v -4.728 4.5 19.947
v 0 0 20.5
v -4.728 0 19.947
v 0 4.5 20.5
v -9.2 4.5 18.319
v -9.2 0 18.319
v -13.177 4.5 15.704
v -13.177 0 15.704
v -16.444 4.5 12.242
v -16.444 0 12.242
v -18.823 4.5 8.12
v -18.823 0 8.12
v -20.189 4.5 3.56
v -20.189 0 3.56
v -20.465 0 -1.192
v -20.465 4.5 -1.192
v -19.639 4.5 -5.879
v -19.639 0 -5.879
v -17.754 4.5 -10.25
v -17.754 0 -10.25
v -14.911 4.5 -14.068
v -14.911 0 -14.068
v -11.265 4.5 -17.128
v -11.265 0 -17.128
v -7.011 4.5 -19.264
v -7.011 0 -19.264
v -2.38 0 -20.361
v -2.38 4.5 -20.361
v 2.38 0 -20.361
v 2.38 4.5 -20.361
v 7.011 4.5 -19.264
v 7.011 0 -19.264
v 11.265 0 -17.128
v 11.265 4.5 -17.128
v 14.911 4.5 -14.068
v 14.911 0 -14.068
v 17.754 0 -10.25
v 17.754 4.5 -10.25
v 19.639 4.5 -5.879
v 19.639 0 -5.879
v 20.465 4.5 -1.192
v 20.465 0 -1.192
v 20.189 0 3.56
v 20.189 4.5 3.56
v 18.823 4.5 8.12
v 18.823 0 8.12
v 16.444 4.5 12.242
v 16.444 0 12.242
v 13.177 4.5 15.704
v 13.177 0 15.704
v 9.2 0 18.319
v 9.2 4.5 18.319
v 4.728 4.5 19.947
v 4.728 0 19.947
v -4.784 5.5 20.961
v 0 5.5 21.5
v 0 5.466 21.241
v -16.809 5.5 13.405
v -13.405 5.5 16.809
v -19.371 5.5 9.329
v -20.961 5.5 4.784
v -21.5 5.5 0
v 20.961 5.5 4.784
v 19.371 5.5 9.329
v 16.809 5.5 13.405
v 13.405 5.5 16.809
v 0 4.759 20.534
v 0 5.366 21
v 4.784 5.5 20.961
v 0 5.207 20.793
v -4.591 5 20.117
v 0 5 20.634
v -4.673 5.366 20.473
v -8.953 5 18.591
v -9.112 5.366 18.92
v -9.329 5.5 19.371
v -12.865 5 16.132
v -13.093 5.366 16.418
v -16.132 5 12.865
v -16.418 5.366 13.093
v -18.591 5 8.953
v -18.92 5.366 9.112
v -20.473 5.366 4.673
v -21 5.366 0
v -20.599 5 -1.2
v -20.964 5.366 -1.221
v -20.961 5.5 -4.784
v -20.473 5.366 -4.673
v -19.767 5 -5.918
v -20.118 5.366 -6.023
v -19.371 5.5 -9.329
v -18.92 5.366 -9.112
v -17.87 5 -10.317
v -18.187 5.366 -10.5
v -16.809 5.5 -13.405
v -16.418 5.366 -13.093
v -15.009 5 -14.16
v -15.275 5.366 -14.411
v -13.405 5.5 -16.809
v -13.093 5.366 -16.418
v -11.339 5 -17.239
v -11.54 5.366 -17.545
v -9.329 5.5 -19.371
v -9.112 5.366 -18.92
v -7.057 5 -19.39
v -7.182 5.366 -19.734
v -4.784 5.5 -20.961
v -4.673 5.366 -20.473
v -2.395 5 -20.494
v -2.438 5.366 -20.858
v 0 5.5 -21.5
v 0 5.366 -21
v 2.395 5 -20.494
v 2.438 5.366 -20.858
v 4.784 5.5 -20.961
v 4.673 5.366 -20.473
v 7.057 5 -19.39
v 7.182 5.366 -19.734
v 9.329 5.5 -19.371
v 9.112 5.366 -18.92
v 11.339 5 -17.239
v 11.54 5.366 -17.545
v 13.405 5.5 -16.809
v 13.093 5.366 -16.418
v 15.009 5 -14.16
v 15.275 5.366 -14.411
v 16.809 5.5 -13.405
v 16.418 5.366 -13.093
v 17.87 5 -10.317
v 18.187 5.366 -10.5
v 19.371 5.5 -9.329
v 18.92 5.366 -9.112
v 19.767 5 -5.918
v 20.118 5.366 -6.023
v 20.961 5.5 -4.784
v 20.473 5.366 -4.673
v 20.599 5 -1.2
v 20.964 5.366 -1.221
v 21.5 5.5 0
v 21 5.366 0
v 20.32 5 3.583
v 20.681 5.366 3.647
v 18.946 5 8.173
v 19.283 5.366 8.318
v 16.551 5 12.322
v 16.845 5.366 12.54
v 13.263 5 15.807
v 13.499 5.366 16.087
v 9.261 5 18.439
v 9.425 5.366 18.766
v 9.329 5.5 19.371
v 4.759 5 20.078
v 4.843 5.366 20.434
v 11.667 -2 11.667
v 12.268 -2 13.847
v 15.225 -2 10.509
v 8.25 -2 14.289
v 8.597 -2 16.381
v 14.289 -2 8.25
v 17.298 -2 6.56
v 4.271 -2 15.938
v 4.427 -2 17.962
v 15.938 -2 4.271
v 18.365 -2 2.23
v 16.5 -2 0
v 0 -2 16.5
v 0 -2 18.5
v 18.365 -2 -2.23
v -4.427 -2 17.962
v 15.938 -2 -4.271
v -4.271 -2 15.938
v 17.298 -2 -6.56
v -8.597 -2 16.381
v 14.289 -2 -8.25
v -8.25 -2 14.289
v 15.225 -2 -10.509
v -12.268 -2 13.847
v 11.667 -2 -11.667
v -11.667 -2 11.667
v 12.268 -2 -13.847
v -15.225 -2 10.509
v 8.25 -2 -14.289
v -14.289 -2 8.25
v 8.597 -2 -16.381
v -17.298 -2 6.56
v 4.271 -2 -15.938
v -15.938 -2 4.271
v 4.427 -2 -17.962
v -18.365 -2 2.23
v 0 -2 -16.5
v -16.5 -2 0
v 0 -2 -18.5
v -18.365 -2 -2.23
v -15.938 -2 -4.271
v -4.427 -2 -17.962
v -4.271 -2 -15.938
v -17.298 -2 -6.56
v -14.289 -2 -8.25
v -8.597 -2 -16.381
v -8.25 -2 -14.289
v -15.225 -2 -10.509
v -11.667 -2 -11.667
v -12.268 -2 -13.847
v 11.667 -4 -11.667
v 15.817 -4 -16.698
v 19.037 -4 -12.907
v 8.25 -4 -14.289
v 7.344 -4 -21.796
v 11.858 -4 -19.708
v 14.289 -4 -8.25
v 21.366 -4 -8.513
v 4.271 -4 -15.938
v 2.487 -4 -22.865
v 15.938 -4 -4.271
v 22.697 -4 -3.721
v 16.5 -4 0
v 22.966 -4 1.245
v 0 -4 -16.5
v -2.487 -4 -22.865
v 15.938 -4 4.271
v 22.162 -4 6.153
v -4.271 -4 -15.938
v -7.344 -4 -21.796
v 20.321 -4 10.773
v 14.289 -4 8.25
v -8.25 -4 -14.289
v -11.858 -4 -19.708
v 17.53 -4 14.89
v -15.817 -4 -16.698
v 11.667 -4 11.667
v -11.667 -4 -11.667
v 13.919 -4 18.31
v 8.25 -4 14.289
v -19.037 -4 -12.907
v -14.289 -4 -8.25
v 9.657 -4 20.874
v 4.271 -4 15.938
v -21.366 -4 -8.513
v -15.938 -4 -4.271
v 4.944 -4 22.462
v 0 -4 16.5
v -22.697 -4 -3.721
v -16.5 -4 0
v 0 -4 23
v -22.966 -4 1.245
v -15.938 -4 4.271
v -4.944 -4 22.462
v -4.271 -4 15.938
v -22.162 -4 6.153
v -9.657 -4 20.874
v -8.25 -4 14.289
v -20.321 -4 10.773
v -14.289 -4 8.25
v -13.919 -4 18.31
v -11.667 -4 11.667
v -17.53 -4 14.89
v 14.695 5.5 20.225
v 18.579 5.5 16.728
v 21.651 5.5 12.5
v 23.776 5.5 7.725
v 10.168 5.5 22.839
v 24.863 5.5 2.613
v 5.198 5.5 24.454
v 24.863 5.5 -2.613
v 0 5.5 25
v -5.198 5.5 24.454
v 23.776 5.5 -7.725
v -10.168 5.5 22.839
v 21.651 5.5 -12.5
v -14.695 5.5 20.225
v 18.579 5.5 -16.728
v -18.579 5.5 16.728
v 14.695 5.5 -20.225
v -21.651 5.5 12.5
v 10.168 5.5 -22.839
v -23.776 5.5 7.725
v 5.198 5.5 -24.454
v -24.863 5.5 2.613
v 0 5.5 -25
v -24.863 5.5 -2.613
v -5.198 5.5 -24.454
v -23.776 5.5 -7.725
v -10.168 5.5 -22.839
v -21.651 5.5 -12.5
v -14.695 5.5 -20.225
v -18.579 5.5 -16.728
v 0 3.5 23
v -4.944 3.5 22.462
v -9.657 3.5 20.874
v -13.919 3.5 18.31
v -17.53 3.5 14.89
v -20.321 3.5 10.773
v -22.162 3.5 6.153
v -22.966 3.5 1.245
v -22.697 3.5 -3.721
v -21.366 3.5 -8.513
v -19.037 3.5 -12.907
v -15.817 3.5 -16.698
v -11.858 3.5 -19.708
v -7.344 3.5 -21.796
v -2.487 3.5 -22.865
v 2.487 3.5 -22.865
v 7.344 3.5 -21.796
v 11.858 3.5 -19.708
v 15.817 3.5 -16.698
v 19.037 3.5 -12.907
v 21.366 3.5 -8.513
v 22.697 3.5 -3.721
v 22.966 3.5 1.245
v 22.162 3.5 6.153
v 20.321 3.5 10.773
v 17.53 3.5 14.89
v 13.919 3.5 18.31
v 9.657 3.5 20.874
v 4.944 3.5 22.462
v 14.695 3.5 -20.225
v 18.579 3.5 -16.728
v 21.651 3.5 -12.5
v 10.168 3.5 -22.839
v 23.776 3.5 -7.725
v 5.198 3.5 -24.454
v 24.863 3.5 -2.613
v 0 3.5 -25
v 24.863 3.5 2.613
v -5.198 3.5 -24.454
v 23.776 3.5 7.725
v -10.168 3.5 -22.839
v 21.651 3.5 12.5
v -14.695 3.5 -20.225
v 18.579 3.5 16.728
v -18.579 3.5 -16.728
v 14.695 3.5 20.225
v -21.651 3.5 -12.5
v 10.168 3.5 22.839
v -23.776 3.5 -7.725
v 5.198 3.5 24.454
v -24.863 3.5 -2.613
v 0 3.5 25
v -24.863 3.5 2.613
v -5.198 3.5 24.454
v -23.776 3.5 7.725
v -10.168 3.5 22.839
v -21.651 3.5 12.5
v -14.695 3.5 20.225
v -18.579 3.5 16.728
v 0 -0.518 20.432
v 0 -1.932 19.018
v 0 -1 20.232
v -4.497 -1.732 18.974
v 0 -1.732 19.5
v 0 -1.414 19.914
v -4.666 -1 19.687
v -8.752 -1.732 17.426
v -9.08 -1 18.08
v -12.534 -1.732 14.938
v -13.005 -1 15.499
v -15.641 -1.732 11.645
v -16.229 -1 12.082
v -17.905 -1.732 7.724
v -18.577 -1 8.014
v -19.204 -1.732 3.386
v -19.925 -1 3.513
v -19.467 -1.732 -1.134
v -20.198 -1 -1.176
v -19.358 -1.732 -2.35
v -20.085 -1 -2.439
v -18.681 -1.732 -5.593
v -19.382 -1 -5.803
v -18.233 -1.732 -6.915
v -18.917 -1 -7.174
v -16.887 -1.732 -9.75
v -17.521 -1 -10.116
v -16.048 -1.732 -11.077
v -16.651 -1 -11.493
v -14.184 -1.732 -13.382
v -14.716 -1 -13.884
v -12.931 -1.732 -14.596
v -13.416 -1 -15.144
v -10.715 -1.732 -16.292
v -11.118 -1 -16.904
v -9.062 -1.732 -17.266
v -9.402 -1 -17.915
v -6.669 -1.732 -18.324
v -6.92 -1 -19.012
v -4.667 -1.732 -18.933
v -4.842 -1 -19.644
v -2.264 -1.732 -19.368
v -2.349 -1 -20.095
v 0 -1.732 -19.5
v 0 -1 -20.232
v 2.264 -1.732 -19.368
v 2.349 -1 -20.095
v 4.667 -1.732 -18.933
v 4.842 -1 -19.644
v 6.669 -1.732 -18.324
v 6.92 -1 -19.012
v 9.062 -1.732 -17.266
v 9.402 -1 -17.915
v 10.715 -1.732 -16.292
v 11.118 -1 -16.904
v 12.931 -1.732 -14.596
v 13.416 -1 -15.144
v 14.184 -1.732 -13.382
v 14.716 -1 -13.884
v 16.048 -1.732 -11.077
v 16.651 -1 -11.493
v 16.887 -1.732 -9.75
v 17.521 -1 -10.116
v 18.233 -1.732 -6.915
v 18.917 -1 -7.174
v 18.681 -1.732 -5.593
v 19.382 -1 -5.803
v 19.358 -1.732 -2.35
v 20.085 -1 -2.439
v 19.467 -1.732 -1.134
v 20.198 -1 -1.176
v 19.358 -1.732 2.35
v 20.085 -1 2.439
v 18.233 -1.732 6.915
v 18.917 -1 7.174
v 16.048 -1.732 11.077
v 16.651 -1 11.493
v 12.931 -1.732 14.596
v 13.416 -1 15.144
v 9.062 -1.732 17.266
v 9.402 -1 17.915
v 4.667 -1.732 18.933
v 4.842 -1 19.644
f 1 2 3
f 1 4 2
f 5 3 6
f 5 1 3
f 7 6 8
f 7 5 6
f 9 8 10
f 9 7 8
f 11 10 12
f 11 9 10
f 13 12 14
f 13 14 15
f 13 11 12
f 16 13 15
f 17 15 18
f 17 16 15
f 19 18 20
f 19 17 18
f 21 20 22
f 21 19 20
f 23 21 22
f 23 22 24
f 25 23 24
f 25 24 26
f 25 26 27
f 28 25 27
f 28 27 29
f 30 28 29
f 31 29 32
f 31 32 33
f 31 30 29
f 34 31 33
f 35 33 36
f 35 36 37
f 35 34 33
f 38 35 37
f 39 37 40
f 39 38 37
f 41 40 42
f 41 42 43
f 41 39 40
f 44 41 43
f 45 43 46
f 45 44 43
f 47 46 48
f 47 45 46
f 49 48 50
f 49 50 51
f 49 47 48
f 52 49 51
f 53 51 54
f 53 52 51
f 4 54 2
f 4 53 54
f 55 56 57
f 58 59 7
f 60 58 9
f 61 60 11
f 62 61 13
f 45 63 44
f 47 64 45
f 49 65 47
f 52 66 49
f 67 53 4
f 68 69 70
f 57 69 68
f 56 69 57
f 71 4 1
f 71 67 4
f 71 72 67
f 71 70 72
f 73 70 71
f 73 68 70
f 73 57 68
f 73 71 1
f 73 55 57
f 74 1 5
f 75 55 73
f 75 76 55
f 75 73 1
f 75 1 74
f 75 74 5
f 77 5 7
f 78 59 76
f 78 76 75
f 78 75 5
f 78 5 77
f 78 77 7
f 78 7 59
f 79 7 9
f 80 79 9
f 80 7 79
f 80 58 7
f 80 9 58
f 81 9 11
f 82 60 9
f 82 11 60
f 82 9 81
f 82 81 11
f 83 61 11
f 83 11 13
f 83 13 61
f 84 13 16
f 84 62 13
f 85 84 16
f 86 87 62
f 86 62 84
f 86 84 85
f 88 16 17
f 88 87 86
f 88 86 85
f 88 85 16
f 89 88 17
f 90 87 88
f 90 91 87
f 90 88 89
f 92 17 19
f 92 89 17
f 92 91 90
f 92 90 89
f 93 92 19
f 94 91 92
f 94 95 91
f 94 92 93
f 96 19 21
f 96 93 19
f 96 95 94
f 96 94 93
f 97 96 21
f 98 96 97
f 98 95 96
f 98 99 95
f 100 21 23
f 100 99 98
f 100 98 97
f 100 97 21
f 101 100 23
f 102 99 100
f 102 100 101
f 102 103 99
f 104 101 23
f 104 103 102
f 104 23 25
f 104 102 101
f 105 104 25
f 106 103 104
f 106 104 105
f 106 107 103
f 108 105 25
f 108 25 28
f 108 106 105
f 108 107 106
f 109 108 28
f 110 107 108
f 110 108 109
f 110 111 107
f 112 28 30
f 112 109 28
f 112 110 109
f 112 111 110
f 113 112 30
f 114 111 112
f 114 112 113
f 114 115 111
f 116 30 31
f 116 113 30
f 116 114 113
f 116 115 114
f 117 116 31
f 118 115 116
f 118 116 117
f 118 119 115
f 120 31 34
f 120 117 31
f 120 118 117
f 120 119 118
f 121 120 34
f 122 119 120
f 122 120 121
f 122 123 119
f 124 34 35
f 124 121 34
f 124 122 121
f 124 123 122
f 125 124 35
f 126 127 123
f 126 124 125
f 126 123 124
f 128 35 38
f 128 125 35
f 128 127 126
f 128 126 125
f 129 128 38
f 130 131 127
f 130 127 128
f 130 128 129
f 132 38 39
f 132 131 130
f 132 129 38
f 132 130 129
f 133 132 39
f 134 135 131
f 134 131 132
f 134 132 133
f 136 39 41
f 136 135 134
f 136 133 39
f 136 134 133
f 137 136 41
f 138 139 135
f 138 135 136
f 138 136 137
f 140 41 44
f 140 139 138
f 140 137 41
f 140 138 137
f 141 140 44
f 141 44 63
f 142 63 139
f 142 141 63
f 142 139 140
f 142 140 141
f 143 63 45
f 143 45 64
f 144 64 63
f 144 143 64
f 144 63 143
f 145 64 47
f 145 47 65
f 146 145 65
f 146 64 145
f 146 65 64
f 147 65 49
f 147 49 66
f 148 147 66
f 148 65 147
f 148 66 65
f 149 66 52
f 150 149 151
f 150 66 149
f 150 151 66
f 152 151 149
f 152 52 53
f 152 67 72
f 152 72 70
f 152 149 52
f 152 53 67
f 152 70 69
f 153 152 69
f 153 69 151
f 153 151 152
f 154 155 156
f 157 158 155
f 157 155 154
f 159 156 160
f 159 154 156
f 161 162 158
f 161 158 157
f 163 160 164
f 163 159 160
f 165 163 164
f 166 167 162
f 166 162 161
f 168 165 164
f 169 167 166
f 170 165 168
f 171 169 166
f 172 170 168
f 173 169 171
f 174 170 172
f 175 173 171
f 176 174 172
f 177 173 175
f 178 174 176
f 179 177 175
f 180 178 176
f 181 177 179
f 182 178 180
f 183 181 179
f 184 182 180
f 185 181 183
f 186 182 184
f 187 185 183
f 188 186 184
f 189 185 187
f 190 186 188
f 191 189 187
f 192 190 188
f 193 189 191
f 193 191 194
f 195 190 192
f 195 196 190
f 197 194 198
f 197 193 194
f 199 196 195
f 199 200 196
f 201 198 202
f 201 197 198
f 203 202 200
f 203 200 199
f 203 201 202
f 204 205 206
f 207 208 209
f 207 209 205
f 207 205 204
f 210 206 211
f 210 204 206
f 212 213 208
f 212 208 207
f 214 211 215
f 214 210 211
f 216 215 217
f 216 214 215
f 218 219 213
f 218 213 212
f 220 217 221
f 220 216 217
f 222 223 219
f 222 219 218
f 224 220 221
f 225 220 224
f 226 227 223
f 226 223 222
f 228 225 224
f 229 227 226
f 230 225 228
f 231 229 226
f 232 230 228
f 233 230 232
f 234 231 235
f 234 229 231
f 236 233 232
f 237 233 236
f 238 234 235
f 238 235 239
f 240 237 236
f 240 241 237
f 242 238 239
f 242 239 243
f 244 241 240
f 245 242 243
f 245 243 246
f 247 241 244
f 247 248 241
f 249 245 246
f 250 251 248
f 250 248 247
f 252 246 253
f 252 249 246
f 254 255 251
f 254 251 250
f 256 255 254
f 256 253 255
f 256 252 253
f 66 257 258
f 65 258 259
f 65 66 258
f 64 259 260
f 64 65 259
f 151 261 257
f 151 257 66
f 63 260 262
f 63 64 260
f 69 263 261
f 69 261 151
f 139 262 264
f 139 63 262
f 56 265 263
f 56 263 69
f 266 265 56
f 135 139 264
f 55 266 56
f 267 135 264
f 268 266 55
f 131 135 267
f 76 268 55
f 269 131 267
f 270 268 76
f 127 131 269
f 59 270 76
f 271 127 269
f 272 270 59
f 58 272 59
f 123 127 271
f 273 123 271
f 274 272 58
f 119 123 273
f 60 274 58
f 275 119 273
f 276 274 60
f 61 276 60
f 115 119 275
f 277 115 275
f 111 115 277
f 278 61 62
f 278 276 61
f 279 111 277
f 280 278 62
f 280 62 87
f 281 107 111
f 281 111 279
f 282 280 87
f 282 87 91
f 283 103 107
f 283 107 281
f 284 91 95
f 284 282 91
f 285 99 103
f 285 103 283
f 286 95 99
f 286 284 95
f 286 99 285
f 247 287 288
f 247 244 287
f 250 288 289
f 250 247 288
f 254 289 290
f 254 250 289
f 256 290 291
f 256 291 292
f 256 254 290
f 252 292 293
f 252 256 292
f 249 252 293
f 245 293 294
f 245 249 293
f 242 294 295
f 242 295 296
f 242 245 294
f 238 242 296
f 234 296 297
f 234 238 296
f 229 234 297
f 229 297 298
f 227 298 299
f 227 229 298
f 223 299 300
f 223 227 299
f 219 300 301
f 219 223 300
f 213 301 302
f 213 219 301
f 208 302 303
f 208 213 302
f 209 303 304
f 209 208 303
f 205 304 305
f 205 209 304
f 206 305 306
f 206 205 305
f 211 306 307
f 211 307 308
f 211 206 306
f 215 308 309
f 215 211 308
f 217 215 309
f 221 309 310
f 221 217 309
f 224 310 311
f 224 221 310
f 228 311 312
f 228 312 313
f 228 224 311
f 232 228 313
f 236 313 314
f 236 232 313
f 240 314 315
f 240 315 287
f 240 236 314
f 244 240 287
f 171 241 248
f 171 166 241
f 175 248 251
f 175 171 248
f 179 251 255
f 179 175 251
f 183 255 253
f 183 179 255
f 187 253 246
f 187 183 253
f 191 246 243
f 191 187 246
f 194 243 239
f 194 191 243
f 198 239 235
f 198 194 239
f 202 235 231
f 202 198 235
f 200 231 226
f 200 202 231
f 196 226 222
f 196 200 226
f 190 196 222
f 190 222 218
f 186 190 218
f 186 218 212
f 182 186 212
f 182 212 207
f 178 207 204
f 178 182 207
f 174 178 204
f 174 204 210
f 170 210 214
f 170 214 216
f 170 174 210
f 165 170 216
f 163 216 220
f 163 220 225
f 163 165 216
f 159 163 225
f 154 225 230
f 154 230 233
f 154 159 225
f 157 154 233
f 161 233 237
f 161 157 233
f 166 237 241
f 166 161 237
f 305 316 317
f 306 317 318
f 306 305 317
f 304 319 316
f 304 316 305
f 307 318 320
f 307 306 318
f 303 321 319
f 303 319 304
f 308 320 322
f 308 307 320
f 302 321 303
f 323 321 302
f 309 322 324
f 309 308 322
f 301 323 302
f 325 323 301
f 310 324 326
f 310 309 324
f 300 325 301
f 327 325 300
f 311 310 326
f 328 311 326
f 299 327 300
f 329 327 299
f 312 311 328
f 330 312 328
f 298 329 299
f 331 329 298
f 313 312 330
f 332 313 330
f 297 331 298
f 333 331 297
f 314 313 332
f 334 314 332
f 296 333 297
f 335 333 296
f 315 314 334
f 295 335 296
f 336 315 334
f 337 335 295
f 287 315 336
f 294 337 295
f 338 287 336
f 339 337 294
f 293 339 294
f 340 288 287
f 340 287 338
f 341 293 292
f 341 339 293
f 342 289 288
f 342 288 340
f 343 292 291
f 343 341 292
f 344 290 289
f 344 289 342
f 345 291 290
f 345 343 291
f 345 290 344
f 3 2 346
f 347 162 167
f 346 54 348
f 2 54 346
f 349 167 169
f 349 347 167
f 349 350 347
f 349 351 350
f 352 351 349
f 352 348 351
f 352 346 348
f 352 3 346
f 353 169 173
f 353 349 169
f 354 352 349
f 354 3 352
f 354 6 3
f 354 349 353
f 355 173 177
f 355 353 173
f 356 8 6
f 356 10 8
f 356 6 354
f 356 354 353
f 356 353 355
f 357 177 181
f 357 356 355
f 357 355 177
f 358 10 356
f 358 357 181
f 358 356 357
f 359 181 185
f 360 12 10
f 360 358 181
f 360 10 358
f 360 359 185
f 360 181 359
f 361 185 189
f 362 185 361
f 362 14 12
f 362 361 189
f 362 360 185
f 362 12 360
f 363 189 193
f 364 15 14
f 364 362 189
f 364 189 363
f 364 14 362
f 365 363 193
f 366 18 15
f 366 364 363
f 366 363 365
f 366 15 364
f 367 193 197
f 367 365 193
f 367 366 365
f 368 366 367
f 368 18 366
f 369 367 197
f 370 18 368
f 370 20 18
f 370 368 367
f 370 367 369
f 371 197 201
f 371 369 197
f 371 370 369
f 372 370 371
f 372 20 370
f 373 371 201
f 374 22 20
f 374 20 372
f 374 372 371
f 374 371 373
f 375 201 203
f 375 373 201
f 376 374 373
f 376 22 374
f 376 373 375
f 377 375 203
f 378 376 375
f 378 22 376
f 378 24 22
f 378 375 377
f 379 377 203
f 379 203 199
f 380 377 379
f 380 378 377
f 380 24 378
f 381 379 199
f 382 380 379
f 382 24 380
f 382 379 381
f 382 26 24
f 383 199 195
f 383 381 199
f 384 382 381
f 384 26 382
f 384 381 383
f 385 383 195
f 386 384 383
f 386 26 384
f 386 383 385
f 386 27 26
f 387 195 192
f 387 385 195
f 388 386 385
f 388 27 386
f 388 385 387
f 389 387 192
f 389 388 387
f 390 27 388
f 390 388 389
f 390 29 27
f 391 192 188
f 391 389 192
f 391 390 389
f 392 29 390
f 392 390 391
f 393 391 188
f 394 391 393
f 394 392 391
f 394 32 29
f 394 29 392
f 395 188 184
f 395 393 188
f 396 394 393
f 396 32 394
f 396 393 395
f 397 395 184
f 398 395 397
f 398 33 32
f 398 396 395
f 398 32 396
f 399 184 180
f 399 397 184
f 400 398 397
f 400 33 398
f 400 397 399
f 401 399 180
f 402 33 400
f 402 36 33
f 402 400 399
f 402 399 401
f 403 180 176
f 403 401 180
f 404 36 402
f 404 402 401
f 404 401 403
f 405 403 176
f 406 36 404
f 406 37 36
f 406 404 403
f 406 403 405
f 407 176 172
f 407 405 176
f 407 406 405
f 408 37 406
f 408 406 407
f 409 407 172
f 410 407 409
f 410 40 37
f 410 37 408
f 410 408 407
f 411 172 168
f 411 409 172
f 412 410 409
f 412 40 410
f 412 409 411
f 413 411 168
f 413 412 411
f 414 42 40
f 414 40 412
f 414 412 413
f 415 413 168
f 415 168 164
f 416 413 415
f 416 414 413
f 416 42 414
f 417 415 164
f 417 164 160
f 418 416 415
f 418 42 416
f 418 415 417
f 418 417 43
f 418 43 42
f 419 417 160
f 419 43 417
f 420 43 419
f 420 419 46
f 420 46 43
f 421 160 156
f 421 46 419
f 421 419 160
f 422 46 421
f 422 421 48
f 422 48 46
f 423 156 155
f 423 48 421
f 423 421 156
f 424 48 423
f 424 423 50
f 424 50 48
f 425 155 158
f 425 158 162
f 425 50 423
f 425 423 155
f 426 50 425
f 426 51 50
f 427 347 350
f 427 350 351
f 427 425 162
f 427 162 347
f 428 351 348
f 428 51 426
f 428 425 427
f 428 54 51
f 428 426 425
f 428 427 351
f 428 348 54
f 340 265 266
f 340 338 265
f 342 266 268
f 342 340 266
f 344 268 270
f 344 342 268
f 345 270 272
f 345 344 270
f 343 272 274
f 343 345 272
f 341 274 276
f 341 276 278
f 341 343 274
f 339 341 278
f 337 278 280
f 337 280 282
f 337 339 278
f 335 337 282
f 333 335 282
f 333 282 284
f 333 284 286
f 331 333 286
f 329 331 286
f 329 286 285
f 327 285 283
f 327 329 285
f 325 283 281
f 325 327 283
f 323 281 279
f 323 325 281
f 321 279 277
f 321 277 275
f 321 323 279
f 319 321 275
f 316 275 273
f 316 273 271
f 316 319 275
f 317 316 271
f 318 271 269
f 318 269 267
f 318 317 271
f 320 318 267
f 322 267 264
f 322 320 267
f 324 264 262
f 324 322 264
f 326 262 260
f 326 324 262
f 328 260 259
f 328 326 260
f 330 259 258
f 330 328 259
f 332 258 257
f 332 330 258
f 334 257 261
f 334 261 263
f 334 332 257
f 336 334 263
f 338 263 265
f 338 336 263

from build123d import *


with BuildPart() as part:
    # Esquisse1 → Révolution1 (revolve)
    with BuildSketch(Plane.XY, mode=Mode.PRIVATE) as r_volution1_sk:
        with BuildLine():
            Line((-16.5, -4), (-16.5, -2))
            Line((-16.5, -2), (-18.5, -2))
            ThreePointArc((-18.5, -2), (-19.914213562, -1.414213562), (-20.5, 0))
            Line((-20.5, 0), (-20.5, 4.5))
            ThreePointArc((-20.5, 4.5), (-20.792893219, 5.207106781), (-21.5, 5.5))
            Line((-21.5, 5.5), (-25, 5.5))
            Line((-25, 5.5), (-25, 3.5))
            Line((-25, 3.5), (-23, 3.5))
            Line((-23, 3.5), (-23, -4))
            Line((-23, -4), (-16.5, -4))
        make_face()
    revolve(r_volution1_sk.sketch.rotate(Axis((0, 27.606261023, 0), (0, -1, 0)), 270), axis=Axis((0, 27.606261023, 0), (0, -1, 0)))  # turned: the seam where the file's is


solid = part.part
